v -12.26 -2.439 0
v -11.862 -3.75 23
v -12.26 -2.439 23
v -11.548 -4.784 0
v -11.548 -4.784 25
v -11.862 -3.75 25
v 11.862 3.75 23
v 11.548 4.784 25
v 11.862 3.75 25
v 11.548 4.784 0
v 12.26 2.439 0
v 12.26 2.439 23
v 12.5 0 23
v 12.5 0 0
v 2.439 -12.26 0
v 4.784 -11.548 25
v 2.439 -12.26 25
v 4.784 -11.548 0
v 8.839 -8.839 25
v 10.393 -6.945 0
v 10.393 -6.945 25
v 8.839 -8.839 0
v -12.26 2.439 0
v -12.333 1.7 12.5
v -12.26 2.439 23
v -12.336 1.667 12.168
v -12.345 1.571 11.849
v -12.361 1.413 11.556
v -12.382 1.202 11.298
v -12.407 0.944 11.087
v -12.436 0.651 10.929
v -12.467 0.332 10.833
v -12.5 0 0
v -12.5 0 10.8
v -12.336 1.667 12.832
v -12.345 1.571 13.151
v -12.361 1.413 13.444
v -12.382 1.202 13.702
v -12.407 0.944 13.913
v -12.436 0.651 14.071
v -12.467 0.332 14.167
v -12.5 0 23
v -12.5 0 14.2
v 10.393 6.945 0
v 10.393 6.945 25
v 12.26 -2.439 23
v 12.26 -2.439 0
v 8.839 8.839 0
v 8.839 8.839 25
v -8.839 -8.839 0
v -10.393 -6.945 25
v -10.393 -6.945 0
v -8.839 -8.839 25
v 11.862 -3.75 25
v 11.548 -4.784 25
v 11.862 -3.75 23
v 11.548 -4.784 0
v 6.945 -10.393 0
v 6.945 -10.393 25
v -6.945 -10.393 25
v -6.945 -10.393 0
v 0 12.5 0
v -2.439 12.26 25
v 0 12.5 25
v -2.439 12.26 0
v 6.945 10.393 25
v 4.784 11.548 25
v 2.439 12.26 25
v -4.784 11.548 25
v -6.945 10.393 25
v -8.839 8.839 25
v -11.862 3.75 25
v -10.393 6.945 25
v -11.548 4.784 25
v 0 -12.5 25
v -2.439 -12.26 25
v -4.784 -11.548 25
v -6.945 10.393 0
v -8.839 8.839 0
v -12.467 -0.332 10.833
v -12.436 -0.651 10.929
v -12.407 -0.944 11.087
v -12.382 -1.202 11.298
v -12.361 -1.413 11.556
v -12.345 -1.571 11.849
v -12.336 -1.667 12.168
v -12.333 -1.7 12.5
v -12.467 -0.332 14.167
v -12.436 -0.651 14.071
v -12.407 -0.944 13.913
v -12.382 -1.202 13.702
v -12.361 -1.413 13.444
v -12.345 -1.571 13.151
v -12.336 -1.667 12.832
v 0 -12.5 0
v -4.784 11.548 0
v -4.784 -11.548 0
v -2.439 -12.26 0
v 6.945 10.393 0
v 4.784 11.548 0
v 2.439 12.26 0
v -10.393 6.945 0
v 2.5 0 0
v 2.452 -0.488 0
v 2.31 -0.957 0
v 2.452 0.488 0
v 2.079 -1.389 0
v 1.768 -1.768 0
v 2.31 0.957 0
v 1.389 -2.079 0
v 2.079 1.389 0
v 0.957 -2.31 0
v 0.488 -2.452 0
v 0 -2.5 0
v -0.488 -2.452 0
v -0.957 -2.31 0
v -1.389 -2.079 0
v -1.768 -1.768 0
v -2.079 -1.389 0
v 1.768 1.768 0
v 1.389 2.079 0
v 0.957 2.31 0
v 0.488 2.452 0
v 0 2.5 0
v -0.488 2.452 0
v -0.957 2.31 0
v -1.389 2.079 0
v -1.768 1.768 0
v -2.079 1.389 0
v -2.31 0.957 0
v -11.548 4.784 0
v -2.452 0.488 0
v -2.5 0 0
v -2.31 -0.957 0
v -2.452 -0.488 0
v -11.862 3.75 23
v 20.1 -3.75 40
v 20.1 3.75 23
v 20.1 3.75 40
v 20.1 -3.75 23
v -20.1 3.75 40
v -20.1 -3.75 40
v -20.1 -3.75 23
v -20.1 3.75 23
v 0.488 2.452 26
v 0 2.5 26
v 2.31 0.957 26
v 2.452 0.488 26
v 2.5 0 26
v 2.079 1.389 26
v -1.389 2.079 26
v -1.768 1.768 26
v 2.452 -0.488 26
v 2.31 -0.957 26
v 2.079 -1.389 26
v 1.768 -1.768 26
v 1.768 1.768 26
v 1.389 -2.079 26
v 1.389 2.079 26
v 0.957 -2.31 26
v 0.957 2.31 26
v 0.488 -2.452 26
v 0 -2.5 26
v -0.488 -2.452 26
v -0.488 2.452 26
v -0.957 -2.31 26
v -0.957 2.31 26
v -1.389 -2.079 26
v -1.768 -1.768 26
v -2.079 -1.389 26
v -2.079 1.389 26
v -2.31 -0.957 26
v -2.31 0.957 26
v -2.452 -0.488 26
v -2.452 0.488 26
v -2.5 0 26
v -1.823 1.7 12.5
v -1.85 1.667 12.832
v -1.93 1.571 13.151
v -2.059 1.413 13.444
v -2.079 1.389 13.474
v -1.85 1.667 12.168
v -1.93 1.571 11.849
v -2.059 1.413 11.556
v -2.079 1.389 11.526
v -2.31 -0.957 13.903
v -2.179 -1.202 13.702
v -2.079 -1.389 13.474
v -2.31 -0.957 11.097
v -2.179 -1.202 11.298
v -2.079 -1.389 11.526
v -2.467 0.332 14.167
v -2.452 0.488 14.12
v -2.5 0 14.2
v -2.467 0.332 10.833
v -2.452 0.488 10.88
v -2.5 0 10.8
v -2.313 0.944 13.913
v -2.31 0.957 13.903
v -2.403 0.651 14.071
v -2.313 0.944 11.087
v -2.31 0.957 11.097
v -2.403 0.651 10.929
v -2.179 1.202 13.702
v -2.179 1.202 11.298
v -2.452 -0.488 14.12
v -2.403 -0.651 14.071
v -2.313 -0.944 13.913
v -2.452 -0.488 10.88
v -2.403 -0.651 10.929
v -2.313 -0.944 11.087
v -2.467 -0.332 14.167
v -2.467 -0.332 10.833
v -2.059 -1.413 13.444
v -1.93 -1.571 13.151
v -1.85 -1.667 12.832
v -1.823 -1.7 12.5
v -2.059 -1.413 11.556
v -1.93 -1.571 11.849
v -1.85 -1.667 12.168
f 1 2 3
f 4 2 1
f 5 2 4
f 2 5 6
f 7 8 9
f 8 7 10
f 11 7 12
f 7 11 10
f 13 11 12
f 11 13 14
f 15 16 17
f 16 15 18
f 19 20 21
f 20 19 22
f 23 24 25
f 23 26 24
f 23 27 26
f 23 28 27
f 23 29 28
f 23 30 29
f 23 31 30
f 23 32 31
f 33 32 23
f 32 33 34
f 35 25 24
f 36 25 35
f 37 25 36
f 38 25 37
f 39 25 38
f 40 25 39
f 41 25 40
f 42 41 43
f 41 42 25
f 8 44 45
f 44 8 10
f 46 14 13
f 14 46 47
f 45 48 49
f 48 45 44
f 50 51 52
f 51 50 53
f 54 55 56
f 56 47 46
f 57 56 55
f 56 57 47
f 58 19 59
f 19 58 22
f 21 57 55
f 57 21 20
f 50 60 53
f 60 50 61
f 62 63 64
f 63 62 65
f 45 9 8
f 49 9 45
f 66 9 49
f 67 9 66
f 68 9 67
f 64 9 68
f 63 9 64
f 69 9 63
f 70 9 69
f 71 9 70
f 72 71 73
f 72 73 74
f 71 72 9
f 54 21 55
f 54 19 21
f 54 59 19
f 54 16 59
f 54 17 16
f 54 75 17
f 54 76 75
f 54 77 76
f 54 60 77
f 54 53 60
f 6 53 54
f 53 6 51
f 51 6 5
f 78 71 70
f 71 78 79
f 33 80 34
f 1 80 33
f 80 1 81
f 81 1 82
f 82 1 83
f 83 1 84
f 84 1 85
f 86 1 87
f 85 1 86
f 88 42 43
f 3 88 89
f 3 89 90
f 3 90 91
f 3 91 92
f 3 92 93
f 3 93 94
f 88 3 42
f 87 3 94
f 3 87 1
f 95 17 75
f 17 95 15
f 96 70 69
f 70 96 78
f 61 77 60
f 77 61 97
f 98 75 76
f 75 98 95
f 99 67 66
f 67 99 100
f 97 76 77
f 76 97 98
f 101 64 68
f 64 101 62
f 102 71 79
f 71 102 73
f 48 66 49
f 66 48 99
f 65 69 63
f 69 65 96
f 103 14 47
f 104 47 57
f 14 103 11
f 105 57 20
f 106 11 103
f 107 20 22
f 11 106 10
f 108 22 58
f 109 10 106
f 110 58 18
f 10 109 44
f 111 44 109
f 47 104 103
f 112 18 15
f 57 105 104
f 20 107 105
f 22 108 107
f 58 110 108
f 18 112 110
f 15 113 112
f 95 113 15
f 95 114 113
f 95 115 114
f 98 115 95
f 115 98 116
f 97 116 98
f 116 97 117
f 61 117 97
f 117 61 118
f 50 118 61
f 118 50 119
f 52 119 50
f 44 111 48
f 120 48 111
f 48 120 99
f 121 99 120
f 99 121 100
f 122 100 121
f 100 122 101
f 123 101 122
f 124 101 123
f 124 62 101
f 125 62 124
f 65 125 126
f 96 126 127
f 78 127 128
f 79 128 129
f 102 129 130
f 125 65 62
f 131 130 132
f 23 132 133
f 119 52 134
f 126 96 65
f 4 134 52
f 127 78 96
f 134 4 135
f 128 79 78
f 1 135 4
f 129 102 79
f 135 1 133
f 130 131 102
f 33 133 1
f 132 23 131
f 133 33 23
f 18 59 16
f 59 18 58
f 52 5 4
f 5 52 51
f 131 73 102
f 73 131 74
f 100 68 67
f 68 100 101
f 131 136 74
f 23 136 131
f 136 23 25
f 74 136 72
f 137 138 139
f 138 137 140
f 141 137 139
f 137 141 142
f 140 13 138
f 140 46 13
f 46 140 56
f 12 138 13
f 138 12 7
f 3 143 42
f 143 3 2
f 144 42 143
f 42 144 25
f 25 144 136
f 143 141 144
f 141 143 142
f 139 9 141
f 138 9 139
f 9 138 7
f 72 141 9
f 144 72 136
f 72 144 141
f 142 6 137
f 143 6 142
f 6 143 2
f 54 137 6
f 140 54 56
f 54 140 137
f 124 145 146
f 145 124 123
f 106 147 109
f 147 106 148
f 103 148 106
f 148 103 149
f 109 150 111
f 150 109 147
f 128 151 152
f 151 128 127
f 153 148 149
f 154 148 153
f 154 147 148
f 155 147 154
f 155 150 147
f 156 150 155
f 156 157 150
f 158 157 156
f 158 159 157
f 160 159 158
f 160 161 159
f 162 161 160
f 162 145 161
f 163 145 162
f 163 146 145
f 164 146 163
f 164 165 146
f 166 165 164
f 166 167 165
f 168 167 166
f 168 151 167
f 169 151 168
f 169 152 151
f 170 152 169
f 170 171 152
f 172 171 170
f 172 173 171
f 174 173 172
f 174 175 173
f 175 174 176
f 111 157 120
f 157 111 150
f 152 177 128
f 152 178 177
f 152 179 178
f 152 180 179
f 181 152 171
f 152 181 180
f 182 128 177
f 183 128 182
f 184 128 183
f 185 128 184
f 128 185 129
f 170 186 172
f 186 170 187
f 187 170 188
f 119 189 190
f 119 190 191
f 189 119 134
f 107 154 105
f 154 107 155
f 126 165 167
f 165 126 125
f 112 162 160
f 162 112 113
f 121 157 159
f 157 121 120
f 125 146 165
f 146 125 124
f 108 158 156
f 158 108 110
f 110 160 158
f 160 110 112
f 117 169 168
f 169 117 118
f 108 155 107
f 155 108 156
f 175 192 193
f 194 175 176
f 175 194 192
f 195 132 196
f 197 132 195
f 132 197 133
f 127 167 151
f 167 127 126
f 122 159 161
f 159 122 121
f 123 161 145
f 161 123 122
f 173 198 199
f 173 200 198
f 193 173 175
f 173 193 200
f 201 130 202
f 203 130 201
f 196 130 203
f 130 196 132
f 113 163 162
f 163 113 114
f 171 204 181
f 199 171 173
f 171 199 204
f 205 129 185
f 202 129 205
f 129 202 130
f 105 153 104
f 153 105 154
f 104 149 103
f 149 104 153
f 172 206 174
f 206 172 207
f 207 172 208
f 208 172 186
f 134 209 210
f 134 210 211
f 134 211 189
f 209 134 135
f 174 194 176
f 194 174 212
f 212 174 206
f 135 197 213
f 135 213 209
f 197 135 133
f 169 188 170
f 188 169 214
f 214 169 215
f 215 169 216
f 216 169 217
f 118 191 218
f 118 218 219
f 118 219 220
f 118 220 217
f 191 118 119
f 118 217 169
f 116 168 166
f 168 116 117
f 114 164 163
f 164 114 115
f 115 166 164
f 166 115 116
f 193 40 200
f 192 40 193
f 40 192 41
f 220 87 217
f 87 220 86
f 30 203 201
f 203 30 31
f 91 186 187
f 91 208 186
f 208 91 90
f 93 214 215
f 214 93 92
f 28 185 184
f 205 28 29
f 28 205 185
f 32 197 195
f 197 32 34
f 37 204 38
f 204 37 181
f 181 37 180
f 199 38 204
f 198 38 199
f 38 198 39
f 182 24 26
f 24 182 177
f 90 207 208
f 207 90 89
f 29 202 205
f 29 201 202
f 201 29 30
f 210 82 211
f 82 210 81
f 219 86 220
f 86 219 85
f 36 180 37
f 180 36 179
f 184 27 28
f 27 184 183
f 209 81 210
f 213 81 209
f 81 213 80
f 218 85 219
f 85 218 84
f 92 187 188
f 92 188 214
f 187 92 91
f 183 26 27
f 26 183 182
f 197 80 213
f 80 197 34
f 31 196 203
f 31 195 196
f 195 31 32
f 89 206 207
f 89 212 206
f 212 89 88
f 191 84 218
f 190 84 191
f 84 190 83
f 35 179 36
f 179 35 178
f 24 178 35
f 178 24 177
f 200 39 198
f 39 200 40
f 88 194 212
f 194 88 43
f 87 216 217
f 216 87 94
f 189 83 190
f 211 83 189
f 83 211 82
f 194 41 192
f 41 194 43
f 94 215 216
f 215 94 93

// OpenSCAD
$fn = 32;

// ----------------------------------------------------------------------
// Hand knob: 25 x 40.2 x 25 mm
// ----------------------------------------------------------------------

// --- parameters (mm) ---
head_d = 25;              // knob diameter
head_h = 25;              // knob height
hole_d = 5;               // shaft bore
set_d = 3.4;              // set screw tap hole
wing_l = 40.2;            // wing span
wing_w = 7.5;             // wing width
wing_h = 15;              // wing thickness

module body() {
  cylinder(h = head_h, d = head_d);
}

module wing() {
  /* wing sunk 2 mm into the knob so the joint overlaps */
  translate([-wing_l / 2, -wing_w / 2, head_h - 2])
    cube([wing_l, wing_w, wing_h + 2]);
}

difference() {
  union() {
    body();
    wing();
  }
  translate([0, 0, -1]) cylinder(h = head_h + 0 + 2, d = hole_d);
  translate([-head_d / 2 - 1, 0, head_h * 0.5]) rotate([0, 90, 0]) cylinder(h = head_d / 2 + 2, d = set_d);
}
